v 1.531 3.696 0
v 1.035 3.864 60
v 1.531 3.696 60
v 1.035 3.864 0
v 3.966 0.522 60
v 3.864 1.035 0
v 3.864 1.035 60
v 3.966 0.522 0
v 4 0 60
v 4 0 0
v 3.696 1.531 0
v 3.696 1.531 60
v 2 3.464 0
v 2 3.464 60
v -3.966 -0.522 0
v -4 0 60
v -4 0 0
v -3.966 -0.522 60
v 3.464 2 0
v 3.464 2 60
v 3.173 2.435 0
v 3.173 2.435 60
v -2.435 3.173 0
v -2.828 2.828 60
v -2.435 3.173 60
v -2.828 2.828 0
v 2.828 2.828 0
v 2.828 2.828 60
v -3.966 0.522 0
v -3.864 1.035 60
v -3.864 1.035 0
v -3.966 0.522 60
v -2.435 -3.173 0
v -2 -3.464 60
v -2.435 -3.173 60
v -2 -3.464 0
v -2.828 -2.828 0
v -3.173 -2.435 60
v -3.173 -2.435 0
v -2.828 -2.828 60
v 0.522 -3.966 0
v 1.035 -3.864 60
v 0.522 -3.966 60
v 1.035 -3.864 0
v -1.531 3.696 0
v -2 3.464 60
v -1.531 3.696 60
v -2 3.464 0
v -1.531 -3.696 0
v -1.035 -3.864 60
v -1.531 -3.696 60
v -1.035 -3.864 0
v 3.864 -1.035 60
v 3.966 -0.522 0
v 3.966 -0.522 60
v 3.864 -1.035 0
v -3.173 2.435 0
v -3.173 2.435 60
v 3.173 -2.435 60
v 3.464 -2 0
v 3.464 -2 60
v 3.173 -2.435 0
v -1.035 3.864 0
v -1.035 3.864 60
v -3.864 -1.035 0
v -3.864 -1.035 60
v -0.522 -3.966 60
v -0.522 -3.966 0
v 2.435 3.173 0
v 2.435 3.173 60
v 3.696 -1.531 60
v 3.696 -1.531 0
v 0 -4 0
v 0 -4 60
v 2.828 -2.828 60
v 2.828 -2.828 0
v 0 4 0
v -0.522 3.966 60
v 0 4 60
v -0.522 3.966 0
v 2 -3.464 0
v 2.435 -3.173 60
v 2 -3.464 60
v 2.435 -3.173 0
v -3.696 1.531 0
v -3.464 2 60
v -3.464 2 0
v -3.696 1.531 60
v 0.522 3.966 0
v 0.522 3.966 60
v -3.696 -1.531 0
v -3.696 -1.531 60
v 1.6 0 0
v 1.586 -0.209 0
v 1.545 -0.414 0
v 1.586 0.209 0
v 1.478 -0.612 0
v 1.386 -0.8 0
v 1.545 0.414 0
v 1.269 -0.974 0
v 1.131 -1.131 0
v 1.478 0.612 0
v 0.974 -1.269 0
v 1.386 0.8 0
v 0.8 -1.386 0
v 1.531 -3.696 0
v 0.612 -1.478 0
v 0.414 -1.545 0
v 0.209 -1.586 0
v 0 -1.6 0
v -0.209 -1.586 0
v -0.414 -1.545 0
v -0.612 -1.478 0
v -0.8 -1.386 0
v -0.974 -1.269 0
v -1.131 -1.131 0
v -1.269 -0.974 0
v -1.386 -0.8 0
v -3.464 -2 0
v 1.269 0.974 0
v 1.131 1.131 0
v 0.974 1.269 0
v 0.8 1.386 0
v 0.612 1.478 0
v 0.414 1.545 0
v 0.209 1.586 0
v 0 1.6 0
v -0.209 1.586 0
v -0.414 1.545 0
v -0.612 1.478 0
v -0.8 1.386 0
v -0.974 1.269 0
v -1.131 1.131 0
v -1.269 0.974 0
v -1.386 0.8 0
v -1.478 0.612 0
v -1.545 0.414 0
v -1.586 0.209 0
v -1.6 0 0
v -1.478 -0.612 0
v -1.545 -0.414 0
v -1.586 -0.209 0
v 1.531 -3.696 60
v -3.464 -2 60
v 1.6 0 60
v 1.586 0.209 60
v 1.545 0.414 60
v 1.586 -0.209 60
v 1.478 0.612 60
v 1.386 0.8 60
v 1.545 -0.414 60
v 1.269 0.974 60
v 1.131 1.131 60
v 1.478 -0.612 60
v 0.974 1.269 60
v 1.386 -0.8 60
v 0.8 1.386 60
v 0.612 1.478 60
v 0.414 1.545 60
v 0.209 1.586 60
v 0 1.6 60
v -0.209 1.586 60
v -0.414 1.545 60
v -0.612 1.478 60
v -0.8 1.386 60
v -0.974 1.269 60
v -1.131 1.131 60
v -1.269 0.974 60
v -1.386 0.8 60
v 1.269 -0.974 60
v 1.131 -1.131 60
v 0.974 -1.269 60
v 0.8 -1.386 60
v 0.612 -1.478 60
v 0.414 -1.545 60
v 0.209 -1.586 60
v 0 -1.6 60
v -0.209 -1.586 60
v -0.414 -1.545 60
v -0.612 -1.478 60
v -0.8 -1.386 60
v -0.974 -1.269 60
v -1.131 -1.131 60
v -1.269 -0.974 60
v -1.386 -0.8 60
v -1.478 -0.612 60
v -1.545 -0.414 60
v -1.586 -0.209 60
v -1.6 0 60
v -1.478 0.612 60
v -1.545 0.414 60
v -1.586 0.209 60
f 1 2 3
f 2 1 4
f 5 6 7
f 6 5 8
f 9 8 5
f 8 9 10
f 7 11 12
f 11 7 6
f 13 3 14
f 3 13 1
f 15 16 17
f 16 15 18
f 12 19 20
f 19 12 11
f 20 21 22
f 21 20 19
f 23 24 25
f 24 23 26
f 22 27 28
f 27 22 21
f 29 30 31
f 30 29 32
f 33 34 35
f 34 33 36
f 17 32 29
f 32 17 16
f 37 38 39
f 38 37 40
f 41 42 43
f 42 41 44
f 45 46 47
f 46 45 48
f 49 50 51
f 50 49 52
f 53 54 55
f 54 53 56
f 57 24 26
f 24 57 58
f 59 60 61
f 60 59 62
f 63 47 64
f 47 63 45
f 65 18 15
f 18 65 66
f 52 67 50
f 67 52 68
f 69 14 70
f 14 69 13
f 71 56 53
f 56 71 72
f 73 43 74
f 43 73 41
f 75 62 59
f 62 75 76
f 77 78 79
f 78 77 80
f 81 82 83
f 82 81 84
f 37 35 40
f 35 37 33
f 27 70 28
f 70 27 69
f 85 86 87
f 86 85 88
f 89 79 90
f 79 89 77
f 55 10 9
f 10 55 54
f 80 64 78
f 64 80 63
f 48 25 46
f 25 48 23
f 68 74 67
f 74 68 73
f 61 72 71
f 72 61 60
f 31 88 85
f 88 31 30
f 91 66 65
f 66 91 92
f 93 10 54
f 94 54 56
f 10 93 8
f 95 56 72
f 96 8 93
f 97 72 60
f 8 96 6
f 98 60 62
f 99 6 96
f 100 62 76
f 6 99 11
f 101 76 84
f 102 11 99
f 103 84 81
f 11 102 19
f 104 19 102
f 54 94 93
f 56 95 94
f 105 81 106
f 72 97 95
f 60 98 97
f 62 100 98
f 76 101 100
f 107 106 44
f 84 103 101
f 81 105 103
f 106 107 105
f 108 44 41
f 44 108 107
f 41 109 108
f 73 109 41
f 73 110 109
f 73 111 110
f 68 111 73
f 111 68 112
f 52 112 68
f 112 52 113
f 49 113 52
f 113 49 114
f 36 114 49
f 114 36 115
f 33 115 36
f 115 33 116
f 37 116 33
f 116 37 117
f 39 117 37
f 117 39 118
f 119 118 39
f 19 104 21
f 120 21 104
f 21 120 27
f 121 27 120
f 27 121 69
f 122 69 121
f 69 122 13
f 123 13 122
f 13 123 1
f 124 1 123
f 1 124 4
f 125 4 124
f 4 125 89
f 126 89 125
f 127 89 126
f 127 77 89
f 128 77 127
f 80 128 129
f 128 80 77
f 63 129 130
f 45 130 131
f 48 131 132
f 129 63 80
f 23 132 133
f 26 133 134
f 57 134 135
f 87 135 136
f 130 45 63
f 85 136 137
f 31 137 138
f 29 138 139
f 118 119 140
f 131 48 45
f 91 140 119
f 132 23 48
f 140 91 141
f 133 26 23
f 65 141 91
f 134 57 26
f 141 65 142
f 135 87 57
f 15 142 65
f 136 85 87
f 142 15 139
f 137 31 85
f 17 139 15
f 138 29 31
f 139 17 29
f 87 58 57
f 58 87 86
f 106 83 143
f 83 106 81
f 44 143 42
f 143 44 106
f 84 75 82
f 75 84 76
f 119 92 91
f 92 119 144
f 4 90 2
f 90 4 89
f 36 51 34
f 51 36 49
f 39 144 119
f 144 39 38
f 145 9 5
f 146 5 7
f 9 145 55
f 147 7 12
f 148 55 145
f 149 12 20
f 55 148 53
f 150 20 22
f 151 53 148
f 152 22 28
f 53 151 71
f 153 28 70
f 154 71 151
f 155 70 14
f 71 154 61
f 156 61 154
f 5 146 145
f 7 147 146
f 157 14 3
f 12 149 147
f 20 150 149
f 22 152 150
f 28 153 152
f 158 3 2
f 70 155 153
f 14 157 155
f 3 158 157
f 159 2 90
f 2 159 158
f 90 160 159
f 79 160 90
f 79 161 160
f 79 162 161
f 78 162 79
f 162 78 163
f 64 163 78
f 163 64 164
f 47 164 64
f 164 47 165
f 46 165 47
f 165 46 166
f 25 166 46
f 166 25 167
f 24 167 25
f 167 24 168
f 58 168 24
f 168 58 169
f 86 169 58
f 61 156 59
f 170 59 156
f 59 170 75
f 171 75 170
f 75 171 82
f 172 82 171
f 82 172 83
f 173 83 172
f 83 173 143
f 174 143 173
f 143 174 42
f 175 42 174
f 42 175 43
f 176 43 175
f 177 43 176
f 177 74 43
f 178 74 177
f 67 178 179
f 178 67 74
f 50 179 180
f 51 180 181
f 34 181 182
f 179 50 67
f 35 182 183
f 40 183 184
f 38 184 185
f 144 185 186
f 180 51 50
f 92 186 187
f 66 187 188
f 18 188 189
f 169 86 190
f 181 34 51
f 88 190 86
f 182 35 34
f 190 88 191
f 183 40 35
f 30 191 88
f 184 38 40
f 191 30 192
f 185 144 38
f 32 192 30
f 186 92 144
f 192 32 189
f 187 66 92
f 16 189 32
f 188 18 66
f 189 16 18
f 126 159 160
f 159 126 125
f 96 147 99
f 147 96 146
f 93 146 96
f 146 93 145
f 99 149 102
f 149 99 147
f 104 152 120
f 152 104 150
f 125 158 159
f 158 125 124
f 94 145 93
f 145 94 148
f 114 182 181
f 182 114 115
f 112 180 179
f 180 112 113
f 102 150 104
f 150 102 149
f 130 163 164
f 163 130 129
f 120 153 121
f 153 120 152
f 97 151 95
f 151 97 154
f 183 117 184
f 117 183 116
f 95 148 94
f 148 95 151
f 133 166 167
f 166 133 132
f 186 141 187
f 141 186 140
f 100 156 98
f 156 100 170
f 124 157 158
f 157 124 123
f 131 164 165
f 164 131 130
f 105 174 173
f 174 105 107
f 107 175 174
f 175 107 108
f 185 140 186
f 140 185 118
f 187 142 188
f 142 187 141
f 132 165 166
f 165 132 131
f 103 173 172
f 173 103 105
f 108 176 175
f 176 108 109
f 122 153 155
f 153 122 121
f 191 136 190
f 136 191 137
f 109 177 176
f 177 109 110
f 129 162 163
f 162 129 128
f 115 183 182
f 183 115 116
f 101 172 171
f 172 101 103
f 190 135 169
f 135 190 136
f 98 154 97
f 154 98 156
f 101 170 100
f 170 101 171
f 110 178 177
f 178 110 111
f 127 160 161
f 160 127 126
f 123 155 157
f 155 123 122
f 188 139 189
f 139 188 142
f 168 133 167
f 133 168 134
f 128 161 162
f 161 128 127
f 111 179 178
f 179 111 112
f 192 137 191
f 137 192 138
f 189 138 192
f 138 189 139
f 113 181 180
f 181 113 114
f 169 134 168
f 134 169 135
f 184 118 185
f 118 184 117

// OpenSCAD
// Entretoise LIDAR (imprimer x4) - cotes en mm
// Relie la base (grille 20 mm) a la plaque support LD06. Vis M3 traversante.
// Ouvre dans OpenSCAD -> F6 -> File > Export as STL.

/* [Geometrie] */
height = 60;   // hauteur de l'entretoise (60 mm pour monter le LIDAR au-dessus du bras)
od     = 8;    // diametre exterieur
id     = 3.2;  // percage M3 (vis qui relie base -> entretoise -> plaque)

$fn = 48;
eps = 0.01;

difference() {
    cylinder(d = od, h = height);
    translate([0, 0, -eps]) cylinder(d = id, h = height + 2*eps);
}
